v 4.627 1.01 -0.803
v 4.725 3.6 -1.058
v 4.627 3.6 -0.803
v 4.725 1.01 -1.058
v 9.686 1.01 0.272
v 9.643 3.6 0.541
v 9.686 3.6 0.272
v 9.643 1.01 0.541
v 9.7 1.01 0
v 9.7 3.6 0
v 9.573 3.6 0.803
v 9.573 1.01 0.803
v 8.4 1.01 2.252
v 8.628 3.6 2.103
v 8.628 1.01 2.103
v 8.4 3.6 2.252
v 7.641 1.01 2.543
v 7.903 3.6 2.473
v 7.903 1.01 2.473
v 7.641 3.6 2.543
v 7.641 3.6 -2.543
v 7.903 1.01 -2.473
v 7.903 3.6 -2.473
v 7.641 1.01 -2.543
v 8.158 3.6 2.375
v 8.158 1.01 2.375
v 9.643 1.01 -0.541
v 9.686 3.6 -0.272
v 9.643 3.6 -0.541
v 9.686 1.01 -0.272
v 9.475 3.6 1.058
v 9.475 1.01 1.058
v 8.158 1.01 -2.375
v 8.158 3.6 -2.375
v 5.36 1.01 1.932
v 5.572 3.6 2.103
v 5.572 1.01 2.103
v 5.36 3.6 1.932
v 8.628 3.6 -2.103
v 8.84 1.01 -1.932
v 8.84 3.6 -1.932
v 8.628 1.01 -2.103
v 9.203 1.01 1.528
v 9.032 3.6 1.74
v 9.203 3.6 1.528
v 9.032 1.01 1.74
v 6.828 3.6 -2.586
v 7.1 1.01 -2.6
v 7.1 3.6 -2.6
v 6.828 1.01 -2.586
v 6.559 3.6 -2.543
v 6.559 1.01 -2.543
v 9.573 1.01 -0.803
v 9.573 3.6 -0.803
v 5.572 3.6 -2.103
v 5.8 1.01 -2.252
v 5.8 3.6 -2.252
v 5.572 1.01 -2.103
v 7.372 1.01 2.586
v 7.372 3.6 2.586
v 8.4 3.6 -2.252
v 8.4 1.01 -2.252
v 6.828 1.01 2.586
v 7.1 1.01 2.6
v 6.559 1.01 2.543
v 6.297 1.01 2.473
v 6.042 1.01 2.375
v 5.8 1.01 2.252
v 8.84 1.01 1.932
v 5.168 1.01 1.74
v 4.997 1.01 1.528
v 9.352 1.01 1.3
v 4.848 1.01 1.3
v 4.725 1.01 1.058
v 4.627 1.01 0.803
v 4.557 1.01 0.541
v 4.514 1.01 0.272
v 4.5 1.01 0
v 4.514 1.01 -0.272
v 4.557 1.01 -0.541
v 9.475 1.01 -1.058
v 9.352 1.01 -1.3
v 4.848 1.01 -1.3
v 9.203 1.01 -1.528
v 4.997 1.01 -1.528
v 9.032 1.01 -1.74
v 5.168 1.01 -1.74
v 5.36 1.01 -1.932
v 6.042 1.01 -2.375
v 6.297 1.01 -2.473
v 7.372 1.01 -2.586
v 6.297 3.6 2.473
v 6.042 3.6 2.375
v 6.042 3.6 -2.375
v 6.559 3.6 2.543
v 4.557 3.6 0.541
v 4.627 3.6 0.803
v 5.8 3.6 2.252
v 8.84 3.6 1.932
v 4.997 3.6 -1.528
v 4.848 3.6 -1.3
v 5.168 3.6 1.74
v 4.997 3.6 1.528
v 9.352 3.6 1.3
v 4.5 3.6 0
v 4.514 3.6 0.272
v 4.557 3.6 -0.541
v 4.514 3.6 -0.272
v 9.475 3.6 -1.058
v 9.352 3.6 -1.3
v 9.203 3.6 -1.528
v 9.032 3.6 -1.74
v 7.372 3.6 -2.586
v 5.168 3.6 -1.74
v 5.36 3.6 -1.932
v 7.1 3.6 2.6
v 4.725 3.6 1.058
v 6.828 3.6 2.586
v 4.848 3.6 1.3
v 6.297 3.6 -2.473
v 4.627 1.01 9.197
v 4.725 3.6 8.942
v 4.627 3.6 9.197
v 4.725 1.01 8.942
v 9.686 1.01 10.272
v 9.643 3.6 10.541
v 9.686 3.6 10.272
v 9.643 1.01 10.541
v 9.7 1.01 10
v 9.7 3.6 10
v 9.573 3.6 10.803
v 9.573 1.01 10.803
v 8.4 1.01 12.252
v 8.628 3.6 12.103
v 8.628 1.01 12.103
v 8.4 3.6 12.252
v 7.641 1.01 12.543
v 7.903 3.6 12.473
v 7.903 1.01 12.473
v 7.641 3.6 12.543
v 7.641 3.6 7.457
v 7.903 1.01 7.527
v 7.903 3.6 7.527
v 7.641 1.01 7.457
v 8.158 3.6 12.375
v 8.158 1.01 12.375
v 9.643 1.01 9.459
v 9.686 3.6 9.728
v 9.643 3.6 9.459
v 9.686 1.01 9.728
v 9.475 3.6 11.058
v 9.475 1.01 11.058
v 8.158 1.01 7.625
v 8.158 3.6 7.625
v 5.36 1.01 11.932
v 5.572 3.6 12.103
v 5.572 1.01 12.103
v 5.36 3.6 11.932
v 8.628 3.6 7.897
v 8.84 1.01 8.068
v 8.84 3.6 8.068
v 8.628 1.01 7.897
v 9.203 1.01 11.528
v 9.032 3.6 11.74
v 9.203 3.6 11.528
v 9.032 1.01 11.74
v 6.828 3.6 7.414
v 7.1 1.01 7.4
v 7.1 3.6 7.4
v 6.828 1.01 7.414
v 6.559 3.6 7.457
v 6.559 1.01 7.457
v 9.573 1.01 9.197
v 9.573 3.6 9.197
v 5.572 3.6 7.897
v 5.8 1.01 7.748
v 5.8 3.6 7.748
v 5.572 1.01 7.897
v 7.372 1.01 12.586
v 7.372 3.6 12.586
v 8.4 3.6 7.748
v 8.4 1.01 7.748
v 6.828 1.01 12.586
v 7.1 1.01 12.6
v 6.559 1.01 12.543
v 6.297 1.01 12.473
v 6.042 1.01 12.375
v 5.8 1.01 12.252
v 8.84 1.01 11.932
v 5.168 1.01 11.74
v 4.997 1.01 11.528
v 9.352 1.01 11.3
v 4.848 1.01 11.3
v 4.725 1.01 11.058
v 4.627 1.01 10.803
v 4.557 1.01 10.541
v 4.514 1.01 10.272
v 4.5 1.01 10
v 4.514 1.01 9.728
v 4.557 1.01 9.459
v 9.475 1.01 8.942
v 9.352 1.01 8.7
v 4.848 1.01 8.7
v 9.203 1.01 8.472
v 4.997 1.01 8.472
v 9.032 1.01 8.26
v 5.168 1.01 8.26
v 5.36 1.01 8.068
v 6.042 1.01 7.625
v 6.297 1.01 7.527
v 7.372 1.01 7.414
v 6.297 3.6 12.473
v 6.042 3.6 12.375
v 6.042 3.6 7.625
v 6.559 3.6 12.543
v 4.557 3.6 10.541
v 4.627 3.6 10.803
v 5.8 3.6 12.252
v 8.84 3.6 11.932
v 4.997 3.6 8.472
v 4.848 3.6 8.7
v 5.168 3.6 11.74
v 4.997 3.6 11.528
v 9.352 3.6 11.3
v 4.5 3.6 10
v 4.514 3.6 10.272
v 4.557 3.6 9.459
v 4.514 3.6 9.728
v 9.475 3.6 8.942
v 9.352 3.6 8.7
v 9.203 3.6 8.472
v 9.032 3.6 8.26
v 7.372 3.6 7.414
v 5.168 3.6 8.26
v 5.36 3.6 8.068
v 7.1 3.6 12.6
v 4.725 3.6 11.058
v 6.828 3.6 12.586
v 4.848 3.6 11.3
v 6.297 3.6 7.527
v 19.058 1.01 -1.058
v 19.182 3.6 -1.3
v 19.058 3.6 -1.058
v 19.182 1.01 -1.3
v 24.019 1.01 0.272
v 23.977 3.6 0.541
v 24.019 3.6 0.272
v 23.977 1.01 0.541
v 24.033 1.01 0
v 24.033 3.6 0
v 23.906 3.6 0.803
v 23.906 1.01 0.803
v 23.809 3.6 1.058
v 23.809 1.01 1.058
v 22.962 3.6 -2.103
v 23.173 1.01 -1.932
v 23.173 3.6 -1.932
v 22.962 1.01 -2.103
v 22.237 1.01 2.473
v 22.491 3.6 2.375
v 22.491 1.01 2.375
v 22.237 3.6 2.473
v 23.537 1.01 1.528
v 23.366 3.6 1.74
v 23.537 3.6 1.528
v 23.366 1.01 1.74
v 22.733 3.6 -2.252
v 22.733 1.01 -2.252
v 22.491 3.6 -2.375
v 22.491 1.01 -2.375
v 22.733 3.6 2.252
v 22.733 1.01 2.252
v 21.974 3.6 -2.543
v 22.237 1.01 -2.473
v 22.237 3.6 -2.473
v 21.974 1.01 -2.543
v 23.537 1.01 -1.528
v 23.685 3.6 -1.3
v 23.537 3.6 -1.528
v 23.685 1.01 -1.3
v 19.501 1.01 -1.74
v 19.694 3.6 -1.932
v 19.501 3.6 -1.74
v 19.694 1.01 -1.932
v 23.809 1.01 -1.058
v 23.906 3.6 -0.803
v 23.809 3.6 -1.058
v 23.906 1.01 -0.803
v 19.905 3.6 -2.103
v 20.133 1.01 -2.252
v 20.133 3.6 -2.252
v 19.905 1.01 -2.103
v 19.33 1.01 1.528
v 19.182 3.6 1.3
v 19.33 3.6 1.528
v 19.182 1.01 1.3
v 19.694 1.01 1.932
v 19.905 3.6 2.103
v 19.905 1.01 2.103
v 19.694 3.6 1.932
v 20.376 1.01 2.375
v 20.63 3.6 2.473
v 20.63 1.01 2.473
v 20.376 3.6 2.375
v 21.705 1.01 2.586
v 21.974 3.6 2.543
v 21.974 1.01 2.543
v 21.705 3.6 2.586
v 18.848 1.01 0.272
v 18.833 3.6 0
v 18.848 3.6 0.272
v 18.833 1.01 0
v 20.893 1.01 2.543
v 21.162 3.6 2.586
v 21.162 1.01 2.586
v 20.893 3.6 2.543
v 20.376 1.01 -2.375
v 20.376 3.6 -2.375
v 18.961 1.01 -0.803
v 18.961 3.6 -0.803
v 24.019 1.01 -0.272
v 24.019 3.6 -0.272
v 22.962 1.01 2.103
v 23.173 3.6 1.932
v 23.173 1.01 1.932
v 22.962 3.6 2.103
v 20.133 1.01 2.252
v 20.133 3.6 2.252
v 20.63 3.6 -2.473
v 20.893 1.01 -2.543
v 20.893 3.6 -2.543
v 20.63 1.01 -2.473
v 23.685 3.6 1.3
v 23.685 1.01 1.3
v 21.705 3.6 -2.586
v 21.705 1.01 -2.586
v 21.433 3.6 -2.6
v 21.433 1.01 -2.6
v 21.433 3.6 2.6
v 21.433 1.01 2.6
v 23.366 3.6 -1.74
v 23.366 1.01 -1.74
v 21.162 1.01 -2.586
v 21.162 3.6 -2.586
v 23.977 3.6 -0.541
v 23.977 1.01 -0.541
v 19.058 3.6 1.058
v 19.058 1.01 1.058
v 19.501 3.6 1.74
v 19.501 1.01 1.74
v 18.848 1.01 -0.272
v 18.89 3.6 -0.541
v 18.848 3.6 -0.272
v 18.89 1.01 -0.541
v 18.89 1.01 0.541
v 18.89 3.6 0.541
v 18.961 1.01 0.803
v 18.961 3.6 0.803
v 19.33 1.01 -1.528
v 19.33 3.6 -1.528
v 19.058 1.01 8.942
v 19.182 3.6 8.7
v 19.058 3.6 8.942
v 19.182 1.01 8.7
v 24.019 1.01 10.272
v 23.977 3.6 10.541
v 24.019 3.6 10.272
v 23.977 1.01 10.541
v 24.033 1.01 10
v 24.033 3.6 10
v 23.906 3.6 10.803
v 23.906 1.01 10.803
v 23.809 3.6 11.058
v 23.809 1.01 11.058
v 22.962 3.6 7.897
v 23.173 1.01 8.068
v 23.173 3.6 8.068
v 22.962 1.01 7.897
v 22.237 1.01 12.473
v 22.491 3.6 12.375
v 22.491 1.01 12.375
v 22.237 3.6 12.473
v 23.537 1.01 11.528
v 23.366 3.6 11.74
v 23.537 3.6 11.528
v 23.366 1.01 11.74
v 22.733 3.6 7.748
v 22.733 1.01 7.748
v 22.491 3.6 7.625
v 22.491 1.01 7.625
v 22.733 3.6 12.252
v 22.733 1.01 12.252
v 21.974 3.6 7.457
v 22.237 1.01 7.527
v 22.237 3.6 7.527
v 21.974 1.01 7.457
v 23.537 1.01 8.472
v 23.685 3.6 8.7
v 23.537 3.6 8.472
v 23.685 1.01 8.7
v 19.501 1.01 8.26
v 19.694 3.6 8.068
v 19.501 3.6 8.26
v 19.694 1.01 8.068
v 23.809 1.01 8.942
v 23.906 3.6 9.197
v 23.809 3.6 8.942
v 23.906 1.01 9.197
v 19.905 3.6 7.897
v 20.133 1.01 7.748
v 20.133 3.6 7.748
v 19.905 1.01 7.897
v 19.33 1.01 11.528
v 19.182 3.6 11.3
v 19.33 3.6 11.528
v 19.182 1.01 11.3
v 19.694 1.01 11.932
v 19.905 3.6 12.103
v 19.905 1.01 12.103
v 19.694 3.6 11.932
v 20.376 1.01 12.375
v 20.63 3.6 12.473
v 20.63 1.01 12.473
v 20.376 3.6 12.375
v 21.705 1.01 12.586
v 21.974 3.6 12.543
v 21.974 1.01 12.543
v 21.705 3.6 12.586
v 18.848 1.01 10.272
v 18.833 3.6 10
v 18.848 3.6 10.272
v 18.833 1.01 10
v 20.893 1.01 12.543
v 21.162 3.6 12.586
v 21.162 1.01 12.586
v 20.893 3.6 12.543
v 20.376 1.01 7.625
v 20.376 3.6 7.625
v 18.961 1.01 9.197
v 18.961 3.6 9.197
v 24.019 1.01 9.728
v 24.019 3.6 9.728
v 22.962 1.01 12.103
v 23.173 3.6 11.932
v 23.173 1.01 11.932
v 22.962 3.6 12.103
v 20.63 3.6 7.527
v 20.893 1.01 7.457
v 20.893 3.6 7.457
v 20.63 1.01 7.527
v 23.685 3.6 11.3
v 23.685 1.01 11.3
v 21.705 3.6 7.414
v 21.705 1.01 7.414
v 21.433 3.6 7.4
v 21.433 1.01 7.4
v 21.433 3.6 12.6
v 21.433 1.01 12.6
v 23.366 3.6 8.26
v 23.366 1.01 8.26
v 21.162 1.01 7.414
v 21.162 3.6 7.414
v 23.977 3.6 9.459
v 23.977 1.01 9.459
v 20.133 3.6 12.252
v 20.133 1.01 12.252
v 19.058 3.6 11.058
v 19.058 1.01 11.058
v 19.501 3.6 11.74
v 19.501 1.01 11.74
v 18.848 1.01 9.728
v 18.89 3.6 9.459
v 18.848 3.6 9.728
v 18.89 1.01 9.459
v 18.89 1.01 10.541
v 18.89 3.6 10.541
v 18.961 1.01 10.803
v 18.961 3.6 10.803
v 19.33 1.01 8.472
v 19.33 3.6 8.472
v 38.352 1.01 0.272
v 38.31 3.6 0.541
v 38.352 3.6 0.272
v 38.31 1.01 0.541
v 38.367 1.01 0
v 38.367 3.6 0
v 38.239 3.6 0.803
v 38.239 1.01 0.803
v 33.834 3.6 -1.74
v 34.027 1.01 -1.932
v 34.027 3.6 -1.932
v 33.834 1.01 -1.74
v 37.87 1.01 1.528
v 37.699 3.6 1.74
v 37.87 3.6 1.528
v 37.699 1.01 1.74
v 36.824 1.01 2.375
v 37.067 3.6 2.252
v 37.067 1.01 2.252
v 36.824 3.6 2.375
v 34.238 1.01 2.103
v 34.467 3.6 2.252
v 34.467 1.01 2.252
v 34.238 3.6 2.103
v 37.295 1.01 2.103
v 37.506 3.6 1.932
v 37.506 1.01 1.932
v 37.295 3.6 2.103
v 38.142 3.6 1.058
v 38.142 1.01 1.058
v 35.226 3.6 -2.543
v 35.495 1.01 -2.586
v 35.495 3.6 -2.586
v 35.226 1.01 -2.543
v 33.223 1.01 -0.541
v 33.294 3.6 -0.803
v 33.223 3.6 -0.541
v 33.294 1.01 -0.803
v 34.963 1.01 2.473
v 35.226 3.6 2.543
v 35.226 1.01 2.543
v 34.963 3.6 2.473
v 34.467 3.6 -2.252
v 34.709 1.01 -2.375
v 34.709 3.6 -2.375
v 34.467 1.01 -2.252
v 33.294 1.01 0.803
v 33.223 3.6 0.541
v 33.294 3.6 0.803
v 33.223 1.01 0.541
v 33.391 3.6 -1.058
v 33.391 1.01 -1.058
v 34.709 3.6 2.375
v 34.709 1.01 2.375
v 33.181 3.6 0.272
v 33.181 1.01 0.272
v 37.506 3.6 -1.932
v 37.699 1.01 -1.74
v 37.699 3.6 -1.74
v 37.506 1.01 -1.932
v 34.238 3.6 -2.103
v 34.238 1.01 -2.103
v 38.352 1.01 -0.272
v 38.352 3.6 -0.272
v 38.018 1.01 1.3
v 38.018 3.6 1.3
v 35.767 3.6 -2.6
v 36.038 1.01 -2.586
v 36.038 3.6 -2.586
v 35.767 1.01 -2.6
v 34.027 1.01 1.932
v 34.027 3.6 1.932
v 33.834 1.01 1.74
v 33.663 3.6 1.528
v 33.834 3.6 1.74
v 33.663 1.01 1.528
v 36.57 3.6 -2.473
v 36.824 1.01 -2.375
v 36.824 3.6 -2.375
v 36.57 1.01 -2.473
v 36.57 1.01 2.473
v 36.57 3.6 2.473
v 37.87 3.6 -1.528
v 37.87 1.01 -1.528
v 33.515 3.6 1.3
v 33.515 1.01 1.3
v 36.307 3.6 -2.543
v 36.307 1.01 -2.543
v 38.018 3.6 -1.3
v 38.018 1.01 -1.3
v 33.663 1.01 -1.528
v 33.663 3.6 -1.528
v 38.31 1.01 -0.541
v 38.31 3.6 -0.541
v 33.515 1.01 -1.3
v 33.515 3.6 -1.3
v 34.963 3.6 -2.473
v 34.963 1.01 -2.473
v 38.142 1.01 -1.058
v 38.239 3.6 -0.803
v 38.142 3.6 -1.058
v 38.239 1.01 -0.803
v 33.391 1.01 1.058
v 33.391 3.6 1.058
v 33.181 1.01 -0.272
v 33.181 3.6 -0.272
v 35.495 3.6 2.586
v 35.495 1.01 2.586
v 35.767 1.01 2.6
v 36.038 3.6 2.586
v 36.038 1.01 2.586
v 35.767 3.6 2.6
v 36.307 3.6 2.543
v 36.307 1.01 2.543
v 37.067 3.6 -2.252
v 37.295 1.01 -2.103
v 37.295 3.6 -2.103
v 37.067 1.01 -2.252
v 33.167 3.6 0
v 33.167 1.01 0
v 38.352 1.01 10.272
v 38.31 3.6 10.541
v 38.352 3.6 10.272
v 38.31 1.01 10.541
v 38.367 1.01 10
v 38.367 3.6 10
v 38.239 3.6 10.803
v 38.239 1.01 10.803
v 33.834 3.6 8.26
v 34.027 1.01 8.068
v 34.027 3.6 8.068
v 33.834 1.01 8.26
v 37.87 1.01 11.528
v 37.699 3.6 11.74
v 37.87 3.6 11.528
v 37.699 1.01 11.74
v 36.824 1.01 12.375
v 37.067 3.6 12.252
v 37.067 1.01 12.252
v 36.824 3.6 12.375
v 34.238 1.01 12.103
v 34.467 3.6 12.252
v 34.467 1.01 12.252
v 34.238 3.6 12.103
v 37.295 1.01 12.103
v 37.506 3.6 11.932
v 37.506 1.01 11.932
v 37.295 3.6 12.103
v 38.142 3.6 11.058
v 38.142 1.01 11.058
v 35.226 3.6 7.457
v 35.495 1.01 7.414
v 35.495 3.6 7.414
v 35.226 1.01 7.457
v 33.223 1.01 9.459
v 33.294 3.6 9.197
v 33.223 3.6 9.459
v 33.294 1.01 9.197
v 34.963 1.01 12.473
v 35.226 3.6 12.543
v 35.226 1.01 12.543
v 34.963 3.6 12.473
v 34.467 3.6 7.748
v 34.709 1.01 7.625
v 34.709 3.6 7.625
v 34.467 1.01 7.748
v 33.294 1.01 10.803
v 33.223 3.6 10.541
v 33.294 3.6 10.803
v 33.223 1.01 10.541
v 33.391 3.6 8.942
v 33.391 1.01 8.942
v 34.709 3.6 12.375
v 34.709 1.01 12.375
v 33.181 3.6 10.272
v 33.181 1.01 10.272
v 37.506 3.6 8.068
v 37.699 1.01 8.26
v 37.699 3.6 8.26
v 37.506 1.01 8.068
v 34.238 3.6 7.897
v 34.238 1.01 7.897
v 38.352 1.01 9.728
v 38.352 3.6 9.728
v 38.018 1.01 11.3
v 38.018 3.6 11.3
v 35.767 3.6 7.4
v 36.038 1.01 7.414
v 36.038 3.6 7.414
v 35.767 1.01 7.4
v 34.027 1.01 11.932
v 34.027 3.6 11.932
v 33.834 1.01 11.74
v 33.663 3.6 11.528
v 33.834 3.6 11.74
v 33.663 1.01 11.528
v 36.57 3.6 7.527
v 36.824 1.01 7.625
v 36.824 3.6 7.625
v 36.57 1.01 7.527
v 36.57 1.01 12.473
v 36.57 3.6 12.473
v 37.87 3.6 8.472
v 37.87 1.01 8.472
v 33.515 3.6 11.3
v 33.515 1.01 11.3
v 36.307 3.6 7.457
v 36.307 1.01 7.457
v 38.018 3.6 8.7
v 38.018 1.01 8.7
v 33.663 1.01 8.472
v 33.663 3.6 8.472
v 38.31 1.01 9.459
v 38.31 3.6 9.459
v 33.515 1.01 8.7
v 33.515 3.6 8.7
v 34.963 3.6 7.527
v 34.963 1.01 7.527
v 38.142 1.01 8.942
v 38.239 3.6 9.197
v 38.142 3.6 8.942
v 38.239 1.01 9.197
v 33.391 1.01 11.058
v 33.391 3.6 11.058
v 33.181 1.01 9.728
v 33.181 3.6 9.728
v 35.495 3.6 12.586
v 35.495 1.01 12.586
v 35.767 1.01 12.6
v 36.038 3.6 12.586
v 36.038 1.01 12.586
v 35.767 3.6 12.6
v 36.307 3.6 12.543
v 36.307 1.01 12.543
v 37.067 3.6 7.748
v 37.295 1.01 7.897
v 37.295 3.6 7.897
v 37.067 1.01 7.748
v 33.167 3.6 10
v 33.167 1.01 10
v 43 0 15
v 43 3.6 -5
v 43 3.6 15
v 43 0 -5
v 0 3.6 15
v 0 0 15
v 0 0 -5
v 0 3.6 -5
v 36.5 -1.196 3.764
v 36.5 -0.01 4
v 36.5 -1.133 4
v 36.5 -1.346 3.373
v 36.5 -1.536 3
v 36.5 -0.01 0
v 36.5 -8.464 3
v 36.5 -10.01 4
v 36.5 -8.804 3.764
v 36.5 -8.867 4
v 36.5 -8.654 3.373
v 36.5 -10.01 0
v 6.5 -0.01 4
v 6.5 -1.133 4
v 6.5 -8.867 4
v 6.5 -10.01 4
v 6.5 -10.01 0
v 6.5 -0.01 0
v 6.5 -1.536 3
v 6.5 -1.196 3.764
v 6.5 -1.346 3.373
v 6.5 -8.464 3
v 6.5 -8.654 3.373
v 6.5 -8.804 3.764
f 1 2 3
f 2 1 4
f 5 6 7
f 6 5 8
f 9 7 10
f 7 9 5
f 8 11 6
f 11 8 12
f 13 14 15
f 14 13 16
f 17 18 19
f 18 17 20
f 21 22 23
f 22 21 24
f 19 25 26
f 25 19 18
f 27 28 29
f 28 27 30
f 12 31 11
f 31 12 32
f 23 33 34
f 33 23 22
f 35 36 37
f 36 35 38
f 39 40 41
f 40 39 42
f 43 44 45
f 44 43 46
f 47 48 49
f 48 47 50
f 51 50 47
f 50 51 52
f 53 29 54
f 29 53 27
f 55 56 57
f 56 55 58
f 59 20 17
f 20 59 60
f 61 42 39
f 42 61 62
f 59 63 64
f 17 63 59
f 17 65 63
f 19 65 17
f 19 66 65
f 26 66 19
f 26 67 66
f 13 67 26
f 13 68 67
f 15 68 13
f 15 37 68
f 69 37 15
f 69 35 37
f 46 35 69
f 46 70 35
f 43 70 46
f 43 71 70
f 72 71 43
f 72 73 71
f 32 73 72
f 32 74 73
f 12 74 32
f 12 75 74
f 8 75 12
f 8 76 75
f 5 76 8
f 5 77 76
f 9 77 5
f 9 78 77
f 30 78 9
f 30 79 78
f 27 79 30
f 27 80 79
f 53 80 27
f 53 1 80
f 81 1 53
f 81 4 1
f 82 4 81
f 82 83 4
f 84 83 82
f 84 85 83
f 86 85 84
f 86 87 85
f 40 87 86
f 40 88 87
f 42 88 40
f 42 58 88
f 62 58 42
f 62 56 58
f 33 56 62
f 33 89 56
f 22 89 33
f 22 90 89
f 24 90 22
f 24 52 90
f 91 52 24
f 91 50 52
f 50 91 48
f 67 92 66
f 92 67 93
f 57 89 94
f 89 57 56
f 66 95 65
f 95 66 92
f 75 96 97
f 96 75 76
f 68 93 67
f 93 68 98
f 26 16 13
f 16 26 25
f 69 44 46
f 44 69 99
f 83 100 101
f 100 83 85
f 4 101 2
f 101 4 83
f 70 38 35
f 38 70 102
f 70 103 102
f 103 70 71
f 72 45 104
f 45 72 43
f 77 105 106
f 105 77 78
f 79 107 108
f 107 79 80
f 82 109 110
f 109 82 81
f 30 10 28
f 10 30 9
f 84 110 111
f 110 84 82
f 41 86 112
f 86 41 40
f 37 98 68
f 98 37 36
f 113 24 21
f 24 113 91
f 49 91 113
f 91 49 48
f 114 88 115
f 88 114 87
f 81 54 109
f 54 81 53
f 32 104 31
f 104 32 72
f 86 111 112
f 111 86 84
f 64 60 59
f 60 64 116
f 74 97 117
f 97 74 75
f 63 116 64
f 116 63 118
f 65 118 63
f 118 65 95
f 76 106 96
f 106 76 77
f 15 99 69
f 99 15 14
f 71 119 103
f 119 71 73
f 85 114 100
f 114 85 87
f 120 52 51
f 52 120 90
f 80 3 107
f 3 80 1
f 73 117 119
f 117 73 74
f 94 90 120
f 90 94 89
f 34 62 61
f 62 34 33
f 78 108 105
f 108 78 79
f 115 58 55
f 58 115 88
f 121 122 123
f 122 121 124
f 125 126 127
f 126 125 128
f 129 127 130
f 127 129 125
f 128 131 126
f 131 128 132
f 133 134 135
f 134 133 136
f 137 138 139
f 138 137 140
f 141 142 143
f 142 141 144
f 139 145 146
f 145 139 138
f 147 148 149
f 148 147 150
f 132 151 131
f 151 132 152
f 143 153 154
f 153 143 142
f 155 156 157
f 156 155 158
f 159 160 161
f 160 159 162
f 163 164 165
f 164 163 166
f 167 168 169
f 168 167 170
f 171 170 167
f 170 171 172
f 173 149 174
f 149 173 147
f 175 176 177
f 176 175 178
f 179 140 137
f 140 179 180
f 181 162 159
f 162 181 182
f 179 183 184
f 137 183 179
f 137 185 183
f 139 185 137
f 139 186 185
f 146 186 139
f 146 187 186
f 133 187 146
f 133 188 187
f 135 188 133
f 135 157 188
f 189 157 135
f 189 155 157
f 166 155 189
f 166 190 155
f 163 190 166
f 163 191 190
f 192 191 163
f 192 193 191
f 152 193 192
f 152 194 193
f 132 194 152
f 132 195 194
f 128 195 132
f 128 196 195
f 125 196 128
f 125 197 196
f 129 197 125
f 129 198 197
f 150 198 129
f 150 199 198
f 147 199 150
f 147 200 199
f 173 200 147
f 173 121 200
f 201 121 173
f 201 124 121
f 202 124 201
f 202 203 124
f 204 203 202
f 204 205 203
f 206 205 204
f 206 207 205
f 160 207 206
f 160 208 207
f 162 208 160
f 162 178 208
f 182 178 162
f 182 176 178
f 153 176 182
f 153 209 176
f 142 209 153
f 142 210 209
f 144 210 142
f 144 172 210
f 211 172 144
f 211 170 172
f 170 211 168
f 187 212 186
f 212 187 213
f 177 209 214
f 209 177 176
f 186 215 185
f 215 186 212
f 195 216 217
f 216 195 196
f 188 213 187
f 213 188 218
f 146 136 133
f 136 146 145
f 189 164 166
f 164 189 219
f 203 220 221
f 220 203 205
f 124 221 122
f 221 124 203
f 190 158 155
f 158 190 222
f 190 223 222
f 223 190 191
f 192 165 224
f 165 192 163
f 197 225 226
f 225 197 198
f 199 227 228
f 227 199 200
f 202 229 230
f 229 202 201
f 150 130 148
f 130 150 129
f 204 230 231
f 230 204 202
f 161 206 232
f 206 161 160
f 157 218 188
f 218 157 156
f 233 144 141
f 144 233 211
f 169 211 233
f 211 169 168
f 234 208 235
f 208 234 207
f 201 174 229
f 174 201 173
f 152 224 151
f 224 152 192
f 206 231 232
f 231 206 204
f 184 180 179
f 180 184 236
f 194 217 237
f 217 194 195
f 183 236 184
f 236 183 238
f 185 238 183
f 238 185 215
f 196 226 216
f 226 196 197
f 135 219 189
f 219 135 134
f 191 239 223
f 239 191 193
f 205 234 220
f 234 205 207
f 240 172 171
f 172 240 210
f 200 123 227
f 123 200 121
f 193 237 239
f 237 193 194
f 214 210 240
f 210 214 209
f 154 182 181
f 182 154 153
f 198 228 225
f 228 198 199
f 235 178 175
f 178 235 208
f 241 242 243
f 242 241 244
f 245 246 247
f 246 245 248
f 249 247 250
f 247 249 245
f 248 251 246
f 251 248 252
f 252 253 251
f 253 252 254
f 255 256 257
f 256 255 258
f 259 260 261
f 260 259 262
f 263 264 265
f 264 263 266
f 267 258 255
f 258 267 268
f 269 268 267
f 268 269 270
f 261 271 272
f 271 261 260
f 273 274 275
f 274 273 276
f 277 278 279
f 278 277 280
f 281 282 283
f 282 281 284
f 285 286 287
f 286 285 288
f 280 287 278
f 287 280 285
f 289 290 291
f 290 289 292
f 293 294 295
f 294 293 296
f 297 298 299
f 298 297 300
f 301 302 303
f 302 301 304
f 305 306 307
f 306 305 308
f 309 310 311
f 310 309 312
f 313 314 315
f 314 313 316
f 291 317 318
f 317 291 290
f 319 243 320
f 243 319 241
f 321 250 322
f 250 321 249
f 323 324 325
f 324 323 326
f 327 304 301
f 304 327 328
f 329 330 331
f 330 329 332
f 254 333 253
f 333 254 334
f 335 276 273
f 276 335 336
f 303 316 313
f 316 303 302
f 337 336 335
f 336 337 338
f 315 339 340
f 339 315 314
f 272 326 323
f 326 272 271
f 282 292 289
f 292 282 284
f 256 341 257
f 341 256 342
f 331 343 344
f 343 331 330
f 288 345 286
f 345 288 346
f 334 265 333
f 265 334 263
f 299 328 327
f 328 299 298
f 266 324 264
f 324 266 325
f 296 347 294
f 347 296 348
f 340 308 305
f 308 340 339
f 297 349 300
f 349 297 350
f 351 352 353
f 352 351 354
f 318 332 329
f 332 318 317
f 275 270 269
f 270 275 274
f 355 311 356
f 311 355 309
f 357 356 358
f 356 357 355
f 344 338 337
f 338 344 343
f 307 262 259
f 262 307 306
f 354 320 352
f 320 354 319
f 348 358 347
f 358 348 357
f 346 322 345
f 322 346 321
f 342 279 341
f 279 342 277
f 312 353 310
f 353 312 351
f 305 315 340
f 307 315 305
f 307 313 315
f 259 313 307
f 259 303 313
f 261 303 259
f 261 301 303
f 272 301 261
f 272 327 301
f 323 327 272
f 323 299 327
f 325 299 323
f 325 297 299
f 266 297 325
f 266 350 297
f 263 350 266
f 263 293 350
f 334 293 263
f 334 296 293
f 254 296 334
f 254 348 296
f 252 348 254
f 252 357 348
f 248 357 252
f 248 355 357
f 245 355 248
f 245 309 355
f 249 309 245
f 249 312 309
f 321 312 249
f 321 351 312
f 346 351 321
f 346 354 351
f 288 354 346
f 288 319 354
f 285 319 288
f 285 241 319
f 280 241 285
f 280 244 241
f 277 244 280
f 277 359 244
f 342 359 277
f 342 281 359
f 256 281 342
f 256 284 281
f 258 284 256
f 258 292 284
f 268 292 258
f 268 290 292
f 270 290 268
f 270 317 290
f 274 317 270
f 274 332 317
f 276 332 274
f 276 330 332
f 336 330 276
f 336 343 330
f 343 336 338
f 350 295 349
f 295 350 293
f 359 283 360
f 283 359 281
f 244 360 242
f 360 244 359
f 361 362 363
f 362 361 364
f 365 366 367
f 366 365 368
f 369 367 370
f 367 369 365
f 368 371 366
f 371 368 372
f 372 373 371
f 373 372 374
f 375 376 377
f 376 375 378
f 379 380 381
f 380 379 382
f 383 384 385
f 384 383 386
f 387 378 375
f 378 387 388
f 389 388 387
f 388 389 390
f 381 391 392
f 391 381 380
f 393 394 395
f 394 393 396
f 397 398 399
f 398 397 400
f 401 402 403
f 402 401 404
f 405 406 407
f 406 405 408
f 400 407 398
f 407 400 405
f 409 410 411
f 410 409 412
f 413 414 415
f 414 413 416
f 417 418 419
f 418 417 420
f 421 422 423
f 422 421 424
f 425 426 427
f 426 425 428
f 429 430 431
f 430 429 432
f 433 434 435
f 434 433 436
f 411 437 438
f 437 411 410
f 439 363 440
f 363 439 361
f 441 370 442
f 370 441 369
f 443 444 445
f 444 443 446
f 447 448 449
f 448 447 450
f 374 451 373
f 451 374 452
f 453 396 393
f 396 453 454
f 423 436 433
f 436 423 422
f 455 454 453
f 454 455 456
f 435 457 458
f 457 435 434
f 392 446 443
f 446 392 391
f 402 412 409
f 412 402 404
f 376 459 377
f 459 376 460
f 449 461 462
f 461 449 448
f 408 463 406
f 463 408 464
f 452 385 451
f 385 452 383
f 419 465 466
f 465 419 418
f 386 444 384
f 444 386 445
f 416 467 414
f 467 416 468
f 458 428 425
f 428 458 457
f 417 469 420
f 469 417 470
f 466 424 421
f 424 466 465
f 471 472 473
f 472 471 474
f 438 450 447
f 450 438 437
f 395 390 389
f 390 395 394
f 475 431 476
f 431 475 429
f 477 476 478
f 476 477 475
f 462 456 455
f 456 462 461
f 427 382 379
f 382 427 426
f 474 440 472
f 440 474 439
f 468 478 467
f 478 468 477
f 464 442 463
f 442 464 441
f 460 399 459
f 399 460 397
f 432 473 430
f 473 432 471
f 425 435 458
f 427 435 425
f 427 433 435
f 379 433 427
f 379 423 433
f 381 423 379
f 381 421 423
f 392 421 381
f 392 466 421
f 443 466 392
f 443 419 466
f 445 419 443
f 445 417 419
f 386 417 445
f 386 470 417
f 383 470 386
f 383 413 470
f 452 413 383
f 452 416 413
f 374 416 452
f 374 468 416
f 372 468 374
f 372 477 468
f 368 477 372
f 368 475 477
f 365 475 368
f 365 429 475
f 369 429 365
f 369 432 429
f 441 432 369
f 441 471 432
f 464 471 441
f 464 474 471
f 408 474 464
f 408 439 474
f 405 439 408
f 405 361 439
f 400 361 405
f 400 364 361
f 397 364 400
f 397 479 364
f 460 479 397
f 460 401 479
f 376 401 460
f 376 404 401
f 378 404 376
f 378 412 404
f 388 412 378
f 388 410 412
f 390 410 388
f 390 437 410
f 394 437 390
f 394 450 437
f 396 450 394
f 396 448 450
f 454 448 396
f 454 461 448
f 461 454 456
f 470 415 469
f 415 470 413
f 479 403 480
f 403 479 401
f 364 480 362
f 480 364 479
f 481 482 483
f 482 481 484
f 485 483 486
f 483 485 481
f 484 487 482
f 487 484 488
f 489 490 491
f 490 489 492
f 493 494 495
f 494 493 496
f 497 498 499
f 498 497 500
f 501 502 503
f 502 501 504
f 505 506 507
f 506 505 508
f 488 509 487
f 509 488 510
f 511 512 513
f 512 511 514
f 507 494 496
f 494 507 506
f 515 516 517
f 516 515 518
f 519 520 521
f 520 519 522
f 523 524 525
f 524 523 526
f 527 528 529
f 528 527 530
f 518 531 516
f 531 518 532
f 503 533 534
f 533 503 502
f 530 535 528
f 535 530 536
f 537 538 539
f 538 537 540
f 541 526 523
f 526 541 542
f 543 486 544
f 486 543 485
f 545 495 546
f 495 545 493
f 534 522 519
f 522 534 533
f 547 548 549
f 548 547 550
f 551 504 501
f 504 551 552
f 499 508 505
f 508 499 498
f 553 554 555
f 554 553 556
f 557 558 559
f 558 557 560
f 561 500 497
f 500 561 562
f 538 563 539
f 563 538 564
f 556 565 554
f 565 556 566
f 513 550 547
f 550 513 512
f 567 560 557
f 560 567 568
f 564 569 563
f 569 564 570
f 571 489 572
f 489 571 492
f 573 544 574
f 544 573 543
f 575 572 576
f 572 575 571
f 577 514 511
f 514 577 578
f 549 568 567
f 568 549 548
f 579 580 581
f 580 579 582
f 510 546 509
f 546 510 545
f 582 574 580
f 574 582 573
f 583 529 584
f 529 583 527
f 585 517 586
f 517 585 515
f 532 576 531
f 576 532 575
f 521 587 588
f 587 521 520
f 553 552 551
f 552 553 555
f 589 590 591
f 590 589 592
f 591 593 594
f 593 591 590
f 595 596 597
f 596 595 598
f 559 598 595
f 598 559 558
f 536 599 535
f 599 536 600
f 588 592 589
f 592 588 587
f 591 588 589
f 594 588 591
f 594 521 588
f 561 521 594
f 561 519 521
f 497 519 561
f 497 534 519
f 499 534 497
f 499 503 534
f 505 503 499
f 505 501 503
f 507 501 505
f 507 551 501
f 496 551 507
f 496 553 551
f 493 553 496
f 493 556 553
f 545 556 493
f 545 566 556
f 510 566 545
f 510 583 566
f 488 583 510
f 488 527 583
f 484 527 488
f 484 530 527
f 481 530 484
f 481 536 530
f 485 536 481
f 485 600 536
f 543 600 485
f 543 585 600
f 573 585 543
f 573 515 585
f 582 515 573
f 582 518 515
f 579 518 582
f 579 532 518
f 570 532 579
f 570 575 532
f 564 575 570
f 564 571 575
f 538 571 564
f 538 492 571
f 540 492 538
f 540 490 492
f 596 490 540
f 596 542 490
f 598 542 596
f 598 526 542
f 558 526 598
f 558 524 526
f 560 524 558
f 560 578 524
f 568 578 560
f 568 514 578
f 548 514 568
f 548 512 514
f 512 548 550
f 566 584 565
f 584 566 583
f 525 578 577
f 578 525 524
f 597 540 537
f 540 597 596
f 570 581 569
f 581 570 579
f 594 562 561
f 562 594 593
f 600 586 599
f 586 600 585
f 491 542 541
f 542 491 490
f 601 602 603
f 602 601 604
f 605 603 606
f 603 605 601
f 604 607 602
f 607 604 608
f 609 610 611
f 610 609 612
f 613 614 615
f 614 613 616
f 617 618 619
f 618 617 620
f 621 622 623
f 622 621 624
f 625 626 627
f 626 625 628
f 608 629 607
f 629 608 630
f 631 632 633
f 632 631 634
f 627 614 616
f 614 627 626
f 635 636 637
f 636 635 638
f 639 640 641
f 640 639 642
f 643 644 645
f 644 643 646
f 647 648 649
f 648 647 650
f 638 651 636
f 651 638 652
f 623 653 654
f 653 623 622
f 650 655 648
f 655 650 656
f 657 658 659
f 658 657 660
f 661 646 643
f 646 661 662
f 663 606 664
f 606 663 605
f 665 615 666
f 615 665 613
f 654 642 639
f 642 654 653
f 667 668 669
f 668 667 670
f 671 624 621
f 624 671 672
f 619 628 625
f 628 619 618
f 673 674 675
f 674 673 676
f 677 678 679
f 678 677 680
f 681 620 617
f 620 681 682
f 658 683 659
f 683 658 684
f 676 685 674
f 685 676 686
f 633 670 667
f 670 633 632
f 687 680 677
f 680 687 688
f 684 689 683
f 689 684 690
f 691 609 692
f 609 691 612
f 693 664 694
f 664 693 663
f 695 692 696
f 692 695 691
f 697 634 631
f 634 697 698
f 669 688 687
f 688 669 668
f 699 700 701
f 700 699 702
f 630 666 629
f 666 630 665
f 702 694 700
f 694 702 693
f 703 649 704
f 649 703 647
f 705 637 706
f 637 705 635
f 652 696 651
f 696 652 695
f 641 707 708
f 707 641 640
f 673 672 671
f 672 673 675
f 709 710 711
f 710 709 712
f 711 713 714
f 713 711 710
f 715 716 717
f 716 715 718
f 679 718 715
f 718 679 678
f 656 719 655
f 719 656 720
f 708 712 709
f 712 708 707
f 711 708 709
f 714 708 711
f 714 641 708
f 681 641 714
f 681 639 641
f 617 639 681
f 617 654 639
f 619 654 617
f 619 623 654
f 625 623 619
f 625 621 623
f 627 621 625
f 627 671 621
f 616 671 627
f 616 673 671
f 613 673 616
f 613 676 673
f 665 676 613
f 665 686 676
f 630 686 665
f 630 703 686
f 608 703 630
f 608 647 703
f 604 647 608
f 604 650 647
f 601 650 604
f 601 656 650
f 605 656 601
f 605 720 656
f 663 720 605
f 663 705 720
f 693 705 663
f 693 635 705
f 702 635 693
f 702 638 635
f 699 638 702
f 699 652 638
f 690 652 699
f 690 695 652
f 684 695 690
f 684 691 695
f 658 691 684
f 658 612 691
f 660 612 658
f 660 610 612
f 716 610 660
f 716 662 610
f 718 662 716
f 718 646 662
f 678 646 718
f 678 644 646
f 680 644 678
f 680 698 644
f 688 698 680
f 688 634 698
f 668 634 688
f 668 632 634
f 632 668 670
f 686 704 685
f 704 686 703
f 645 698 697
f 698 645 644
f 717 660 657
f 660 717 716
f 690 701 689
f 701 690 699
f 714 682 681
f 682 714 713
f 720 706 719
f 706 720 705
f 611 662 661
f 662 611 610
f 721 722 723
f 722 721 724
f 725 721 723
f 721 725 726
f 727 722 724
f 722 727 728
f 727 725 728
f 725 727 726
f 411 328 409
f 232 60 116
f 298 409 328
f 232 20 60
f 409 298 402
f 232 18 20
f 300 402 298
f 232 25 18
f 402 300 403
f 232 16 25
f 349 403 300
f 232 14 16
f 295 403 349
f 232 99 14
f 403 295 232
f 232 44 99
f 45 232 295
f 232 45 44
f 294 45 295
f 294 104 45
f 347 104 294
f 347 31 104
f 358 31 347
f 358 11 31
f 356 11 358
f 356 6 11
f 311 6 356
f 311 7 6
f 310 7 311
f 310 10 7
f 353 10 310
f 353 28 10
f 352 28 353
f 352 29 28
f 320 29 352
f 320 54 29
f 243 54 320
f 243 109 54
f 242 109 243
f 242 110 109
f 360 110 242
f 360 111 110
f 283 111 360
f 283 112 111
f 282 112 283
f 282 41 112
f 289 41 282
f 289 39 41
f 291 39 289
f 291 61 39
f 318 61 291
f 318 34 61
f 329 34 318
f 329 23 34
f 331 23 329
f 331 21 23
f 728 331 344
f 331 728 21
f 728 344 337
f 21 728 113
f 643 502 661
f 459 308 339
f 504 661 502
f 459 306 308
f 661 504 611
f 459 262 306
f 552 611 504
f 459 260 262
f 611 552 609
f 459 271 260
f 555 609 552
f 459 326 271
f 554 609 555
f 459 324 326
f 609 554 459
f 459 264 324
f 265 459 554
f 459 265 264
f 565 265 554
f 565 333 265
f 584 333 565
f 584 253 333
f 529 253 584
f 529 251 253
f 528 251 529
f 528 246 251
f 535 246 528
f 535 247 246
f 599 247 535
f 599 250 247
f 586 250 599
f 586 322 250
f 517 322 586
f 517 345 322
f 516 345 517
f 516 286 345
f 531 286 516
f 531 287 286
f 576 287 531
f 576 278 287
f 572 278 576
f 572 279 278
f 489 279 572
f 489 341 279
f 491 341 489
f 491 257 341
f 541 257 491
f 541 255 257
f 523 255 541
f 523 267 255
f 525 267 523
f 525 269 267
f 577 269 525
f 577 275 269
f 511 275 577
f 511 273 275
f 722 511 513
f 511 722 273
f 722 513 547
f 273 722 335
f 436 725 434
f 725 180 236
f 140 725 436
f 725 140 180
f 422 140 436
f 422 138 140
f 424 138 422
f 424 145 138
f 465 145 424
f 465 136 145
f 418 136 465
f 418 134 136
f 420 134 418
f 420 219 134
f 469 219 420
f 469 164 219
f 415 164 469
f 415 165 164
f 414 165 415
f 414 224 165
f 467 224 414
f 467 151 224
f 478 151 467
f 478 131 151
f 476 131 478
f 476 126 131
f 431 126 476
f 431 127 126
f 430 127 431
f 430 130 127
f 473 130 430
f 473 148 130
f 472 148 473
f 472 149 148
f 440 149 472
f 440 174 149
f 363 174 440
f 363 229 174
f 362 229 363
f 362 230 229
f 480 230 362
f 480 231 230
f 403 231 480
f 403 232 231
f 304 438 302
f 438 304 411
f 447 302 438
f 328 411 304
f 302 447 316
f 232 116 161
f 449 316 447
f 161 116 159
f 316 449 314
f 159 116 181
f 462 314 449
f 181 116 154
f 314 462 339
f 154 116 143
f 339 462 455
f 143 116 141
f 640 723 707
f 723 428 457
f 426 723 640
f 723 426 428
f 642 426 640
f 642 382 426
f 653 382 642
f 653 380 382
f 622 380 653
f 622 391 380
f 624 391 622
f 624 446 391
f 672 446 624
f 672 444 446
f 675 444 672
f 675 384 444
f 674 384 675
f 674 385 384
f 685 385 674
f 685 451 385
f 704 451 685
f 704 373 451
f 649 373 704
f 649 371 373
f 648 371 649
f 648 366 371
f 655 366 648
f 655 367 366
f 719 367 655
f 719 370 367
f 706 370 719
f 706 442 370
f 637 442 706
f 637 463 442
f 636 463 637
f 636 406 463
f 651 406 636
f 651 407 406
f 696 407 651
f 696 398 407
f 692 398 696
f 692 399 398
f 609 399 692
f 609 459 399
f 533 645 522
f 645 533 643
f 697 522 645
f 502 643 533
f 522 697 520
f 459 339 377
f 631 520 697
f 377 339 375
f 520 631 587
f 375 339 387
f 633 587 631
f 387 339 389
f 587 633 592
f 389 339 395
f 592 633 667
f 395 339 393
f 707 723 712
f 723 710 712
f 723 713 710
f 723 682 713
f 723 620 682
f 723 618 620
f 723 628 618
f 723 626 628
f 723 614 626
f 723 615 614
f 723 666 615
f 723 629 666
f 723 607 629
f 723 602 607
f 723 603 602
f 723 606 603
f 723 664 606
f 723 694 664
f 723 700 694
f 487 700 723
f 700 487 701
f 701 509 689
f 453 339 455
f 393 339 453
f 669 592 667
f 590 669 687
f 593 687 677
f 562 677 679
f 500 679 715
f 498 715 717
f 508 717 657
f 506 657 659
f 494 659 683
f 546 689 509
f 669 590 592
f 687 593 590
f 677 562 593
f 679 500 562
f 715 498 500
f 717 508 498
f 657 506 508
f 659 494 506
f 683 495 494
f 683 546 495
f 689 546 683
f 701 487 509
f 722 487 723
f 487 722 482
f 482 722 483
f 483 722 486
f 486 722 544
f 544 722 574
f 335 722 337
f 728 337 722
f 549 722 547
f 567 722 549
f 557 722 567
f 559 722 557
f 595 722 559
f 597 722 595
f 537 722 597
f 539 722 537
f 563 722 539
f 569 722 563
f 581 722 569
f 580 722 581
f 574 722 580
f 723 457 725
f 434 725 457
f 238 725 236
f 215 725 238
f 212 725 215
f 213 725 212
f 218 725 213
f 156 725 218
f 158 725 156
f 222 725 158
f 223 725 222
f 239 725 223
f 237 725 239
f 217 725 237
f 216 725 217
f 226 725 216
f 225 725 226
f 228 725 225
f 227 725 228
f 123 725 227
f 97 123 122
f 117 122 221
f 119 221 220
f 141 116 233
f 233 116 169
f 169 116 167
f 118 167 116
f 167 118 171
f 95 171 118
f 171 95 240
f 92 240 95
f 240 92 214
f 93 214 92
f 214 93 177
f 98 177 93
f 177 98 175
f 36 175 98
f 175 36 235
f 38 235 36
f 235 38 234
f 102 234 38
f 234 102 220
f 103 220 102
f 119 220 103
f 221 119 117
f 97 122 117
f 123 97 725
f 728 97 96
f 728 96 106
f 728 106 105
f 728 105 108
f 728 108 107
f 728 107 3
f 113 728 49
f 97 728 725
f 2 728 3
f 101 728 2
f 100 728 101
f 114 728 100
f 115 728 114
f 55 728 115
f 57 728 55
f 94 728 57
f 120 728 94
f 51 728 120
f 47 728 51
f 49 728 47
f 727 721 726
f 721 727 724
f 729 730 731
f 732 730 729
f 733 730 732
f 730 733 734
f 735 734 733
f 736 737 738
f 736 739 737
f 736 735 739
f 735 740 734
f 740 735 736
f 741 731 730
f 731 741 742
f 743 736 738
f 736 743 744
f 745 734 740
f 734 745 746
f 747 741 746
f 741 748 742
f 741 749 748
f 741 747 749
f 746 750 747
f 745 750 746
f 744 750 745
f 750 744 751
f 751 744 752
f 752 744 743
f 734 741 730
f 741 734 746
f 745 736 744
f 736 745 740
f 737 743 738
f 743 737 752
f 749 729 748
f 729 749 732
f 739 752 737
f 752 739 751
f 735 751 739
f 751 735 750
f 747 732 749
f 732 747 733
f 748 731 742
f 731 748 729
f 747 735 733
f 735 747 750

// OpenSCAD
$fn = 60;

module all_together() {

    back_width = 43;
    back_depth = 3.6;
    back_height = 20;    
    shelf_width = 30;
    shelf_depth = 10;
    shelf_thickness = 4;
    opener_rest_depth = 7;
        
    module magnet_hole() {
        rotate([90, 0, 0]) 
        cylinder(h = 2.6, d = 5.2, center = false);
    }
    
    module back() {
        difference() {
            cube([back_width, back_depth, back_height]);
            for (i = [-1:1:1]) {            
                translate([back_width/3*(i+1)+7.1, back_depth+.01, back_height/4])
                    magnet_hole();
                translate([back_width/3*(i+1)+7.1, back_depth+.01, back_height/4*3])
                    magnet_hole();
            }
        }
    }
    
    module shelf() {
        difference() {
            translate([(back_width - shelf_width)/2, -shelf_depth - .01, 0]) cube([shelf_width, shelf_depth, shelf_thickness]);
        
            translate([(back_width-shelf_width)/2-.01, -shelf_depth/2, shelf_thickness+1]) rotate([0, 90, 0]) cylinder(h = shelf_width+.02, r = shelf_depth/2 - 1);
        }
        
            translate([(back_width - shelf_width)/2, -shelf_depth+(shelf_depth-opener_rest_depth)/2, 1]) cube([shelf_width, opener_rest_depth, 2]);
    }
    
    translate([0, 0, -5]) back();
    shelf();

}

 
//rotate([-90, 0, 0]) all_together();
all_together();

//printed nicely at .2 faster profile
//magnet holes were very tight, had to push them in with pliers
//6 magnets wasn't enough to hold up the cast iron on, but the steel one held
